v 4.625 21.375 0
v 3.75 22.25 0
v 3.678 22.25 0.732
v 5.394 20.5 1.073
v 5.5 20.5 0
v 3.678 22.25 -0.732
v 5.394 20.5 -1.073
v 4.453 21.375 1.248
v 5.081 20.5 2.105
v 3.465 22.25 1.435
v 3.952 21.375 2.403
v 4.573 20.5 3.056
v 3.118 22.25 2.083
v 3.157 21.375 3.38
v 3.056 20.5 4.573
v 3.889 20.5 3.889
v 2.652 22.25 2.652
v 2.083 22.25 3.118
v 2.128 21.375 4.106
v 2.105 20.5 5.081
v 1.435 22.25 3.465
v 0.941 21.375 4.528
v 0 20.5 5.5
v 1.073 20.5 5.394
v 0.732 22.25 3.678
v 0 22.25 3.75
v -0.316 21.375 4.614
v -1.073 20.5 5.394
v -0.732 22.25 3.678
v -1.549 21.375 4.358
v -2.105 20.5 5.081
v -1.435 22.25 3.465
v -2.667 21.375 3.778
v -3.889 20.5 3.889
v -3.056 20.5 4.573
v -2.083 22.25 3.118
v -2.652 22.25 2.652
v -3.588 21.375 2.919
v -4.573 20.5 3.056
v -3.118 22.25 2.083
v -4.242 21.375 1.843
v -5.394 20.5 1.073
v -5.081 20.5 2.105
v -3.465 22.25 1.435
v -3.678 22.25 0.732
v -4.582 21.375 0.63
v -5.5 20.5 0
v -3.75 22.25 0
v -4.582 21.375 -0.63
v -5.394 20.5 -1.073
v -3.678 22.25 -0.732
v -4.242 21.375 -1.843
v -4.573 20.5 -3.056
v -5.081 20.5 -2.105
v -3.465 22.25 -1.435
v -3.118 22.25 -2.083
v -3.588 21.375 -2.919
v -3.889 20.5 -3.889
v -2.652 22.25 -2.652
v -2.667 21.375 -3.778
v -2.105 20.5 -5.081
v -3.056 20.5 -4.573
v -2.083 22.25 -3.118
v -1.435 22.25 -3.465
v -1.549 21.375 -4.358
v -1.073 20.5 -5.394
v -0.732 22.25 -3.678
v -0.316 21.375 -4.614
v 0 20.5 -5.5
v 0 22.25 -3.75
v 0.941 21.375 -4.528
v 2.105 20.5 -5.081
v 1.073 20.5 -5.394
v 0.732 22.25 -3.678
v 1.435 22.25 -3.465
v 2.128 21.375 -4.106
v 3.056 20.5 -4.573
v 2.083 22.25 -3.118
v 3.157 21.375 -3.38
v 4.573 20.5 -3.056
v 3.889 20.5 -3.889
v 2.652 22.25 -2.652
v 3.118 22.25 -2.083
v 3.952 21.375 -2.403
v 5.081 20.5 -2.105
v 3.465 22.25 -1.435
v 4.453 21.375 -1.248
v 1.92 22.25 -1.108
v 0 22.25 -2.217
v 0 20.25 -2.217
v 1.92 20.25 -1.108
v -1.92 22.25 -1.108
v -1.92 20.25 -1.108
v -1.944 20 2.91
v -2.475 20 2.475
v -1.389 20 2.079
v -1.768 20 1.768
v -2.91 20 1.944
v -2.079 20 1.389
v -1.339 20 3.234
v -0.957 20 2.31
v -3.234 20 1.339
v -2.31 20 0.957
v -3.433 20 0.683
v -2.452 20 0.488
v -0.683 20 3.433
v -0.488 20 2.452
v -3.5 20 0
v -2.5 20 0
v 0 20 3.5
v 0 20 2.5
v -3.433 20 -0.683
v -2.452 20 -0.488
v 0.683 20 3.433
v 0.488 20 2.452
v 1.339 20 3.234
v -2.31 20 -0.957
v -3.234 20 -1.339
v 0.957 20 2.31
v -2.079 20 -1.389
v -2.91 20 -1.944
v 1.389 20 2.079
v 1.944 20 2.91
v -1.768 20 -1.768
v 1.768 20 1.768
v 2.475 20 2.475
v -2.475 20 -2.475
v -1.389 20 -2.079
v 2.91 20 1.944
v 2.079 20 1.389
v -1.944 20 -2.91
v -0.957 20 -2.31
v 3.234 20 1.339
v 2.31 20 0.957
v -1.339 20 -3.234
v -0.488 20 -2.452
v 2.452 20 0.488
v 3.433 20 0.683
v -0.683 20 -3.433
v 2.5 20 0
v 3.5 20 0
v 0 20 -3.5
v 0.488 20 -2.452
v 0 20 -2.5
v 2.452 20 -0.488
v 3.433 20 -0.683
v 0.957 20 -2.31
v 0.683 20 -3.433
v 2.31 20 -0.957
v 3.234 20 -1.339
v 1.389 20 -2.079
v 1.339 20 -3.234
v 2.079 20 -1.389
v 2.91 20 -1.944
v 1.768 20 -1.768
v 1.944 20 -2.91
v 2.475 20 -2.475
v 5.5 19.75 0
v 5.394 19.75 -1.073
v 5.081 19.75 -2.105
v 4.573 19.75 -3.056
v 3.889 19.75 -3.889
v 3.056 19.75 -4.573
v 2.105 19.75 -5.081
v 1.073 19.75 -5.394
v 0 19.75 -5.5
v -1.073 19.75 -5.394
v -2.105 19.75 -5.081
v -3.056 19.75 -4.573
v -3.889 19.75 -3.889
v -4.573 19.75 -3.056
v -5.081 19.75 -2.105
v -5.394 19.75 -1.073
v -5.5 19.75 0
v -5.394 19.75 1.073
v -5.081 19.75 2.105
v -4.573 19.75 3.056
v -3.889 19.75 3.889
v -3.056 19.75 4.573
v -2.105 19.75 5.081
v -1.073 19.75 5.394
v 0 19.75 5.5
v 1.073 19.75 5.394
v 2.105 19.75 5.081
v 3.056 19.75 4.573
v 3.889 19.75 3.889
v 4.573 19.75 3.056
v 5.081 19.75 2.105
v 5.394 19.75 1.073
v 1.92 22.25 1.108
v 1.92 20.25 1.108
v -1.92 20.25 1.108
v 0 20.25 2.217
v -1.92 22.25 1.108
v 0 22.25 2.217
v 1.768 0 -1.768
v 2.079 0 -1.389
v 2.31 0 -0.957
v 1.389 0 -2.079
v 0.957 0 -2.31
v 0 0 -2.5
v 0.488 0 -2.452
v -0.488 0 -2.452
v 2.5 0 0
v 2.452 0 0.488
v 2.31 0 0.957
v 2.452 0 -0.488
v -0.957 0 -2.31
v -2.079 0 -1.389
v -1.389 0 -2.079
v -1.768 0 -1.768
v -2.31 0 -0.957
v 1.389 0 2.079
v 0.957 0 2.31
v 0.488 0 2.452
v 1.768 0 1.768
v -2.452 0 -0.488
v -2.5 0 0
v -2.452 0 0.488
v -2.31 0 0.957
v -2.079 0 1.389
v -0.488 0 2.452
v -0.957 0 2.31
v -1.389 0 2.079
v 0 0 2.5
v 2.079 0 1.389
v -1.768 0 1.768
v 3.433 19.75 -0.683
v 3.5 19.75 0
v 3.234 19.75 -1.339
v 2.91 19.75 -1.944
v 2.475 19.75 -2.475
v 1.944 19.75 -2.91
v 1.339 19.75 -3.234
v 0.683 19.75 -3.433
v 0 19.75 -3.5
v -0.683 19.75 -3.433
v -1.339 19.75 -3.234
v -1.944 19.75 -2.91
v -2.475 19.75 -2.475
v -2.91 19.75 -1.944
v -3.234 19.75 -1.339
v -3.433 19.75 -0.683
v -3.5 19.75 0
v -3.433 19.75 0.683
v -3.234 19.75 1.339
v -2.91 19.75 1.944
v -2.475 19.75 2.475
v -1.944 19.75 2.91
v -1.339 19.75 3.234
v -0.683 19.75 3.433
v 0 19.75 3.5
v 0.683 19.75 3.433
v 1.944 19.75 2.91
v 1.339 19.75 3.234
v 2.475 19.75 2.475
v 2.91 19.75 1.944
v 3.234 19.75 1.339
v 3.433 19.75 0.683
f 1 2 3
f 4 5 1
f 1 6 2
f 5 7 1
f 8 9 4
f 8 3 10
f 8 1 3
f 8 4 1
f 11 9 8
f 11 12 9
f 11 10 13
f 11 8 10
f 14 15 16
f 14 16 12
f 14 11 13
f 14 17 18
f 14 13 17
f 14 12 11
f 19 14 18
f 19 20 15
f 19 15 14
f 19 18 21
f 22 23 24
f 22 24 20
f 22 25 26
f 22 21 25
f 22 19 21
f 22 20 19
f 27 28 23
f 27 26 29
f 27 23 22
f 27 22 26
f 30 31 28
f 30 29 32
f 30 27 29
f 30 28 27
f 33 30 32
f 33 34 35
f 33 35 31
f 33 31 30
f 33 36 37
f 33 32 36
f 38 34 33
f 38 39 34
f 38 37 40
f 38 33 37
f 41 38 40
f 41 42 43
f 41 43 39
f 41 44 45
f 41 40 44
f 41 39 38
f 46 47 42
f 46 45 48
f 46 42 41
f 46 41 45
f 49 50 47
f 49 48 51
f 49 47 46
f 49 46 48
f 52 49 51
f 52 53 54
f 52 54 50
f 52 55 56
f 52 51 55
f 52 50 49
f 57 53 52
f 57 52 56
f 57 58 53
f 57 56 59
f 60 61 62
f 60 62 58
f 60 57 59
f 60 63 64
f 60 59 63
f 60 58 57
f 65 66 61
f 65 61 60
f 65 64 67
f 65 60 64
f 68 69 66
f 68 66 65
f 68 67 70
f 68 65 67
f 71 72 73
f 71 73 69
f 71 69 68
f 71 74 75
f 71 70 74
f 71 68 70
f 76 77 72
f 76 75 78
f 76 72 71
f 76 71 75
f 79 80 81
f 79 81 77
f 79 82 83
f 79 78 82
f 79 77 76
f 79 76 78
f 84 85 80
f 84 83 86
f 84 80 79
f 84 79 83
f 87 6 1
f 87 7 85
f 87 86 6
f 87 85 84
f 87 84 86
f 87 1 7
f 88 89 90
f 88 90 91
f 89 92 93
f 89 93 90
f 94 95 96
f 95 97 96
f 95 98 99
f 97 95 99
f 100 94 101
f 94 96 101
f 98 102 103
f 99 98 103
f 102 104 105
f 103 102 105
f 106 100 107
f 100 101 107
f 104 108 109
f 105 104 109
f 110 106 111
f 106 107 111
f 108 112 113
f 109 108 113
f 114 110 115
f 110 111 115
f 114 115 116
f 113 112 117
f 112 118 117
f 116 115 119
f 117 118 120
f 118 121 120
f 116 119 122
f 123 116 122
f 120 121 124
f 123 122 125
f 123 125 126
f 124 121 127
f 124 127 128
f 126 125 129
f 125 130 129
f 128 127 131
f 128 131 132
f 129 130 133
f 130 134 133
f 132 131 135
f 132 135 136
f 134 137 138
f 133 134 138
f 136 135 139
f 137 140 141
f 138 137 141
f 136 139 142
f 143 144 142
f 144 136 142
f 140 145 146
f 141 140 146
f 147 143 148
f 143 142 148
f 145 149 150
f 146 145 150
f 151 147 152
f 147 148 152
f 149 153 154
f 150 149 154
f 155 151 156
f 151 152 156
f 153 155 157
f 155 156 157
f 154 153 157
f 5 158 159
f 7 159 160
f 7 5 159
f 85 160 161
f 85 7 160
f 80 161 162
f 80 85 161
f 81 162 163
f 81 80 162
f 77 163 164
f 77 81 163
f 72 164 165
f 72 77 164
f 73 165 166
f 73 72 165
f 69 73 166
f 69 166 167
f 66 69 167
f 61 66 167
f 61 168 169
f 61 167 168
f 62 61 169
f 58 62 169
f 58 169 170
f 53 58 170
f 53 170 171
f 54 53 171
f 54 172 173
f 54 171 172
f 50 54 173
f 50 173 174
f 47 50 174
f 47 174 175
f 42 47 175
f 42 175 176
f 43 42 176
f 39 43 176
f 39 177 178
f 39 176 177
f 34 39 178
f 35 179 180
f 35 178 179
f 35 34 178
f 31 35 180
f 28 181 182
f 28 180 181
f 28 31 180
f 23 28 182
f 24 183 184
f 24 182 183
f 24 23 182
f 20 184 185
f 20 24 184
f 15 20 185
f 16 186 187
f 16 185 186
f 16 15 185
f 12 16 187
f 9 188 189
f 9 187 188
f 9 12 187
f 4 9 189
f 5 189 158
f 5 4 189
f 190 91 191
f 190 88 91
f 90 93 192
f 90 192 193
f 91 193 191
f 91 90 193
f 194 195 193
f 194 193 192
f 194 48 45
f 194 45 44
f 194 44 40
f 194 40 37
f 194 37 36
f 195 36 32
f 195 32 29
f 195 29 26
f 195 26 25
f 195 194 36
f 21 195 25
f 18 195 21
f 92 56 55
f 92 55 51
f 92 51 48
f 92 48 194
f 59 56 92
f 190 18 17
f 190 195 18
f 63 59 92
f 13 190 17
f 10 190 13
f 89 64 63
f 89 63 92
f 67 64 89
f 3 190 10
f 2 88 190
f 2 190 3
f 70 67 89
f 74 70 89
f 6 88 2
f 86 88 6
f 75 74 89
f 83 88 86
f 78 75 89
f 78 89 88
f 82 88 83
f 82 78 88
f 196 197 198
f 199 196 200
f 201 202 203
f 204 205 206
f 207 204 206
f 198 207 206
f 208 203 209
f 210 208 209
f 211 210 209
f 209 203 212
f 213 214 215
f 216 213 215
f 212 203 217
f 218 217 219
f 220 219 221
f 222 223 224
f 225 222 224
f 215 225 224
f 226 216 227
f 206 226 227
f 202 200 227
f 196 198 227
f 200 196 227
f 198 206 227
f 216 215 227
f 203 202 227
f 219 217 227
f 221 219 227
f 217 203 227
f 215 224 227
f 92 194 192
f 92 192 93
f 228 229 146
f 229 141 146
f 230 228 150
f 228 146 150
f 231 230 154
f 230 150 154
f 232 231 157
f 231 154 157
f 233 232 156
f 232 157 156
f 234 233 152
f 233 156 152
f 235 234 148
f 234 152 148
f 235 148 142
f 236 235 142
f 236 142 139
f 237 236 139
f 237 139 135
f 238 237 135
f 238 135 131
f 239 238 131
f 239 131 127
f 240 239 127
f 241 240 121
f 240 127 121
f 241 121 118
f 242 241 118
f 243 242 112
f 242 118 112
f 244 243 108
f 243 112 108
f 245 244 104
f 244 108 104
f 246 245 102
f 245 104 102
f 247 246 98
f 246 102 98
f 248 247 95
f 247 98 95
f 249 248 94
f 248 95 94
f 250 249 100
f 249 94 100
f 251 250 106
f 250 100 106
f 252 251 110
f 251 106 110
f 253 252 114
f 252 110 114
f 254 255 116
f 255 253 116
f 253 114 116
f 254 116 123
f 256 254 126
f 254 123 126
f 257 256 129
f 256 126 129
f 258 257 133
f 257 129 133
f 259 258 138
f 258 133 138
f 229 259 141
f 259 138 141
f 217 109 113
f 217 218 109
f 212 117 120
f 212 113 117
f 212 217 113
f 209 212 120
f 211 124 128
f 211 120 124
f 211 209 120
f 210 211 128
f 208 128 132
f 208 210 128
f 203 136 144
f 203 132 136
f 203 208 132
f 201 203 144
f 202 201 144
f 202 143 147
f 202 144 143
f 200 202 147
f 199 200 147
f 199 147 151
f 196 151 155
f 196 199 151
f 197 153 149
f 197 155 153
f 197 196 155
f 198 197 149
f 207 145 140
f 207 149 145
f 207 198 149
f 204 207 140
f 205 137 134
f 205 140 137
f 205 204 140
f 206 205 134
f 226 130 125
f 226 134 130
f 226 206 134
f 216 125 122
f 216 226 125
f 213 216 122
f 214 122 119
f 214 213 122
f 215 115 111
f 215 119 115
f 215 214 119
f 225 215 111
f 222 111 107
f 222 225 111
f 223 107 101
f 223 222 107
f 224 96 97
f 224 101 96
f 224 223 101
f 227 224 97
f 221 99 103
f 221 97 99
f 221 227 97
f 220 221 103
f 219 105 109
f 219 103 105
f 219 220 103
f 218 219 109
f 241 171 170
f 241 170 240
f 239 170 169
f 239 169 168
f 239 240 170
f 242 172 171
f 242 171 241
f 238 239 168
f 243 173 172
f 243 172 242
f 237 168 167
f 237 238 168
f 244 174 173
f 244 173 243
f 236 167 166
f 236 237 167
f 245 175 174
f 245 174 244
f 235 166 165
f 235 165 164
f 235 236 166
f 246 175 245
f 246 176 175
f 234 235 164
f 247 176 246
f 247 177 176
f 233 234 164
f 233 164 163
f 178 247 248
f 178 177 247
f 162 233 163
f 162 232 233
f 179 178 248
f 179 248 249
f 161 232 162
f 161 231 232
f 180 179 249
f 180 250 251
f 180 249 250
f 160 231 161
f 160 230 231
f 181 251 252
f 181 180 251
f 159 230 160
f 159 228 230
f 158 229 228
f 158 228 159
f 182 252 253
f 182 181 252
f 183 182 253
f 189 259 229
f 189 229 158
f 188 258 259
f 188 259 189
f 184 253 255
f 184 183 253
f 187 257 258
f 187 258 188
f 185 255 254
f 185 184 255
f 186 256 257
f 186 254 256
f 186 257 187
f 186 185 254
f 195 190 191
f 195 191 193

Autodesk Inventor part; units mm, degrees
ref_plane "YZ Plane" through (0, 0, 0) normal (1, 0, 0) x (0, 1, 0)
ref_plane "XZ Plane" through (0, 0, 0) normal (0, 1, 0) x (-1, 0, 0)
ref_plane "XY Plane" through (0, 0, 0) normal (0, 0, 1) x (1, 0, 0)
sketch "Sketch1" plane through (0, 0, 0) normal (0, 1, 0) x (-1, 0, 0)
  circle A0 centre (0, 0) radius 2.5
  dimension "d0" = 5
extrude "Extrusion1" add sketch "Sketch1" along normal blind 20
sketch "Sketch2" plane through (0, 20, 0) normal (0, 1, 0) x (1, 0, 0)
  circle A0 centre (0, 0) radius 2.5 projected
  circle A1 centre (0, 0) radius 5.5
  dimension "d3" = 11
extrude "Extrusion2" add sketch "Sketch2" along normal blind 2.25 contours A0 | A1
sketch "Sketch3" plane through (0, 22.25, 0) normal (0, 1, 0) x (1, 0, 0)
  circle A0 centre (0, 0) radius 5.5 projected
  line L0 (0, 2.217) -> (1.92, 1.1085)
  line L1 (1.92, 1.1085) -> (1.92, -1.1085)
  line L2 (1.92, -1.1085) -> (0, -2.217)
  line L3 (0, -2.217) -> (-1.92, -1.1085)
  line L4 (-1.92, -1.1085) -> (-1.92, 1.1085)
  line L5 (-1.92, 1.1085) -> (0, 2.217)
  dimension "d6" = 1.92
chamfer "Chamfer1" distance 1.75 angle 45 1 edges at (-5.5, 22.25, 0)
sketch "Sketch4" plane through (0, 20, 0) normal (0, -1, 0) x (1, 0, 0)
  circle A0 centre (0, 0) radius 5.5 projected
  circle A1 centre (0, 0) radius 2.5 projected
  circle A2 centre (0, 0) radius 3.5
  dimension "d10" = 7
extrude "Extrusion3" add sketch "Sketch4" along normal blind 0.25 contours A0
extrude "Extrusion4" cut sketch "Sketch3" against normal blind 2 contours L0 L1 L2 L3 L4 L5
thread "Thread1" size "M5x0.8" class "6g" standard "ANSI Metric M Profile" full length
properties part number "M5x20BlindScrew" material "Stainless Steel"
